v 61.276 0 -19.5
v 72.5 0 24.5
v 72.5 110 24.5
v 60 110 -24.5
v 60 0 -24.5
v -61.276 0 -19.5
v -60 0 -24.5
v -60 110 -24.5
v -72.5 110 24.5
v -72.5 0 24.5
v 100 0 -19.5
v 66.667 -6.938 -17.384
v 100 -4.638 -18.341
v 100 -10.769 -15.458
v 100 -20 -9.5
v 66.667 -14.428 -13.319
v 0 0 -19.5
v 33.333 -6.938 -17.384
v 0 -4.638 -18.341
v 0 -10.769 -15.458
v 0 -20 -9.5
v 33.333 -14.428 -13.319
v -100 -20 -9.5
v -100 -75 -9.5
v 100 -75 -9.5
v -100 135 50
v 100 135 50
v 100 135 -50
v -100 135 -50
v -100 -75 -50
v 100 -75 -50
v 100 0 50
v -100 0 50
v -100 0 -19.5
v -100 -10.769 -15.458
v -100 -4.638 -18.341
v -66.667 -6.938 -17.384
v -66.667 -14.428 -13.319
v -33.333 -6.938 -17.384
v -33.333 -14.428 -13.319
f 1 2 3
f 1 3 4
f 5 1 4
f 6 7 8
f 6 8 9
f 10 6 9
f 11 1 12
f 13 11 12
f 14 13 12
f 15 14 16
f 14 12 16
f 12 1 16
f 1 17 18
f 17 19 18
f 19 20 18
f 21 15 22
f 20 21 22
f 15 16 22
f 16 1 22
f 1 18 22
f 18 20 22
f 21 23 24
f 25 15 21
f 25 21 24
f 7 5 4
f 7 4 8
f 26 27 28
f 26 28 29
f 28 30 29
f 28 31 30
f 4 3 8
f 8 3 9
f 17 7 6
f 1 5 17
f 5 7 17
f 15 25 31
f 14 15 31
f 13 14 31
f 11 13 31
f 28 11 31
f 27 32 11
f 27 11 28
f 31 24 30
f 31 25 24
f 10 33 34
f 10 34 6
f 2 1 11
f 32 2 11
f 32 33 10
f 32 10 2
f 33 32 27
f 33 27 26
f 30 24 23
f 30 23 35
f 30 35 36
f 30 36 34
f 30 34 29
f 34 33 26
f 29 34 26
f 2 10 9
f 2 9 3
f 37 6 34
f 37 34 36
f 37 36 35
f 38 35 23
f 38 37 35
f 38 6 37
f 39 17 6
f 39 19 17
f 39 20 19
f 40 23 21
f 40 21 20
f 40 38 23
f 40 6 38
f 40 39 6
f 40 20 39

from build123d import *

# Parameters (mm, degrees)
F0_W     = 200
F0_H     = 100
F1_DEPTH = 110
F2_W     = 200
F2_H     = 100
F3_DEPTH = 25
F5_DEPTH = 100


with BuildPart() as f1:
    # F0 (on Front) → F1 (new body)
    with BuildSketch(Plane.XZ):
        Rectangle(F0_W, F0_H)
        Polygon((-60, -24.5), (-72.5, 24.5), (72.5, 24.5), (60, -24.5), align=None, mode=Mode.SUBTRACT)
    extrude(amount=-F1_DEPTH)

    # F2 (on face) → F3 (join)
    with BuildSketch(Plane(origin=(0, 110, 0), x_dir=(-1, 0, 0), z_dir=(0, 1, 0))):
        Rectangle(F2_W, F2_H)
    extrude(amount=F3_DEPTH)

    # F4 (on Right) → F5 (join, symmetric)
    with BuildSketch(Plane.YZ):
        with BuildLine():
            Line((-75, -50), (0, -50))
            Line((0, -50), (0, -19.5))
            add(Edge.make_bspline(
                [(0, -19.5), (-5.83801, -19.088345), (-16.211687, -12.465747), (-20, -9.5)],
                knots=[0, 0, 0, 0, 22.36068, 22.36068, 22.36068, 22.36068], degree=3))
            Line((-20, -9.5), (-75, -9.5))
            Line((-75, -9.5), (-75, -50))
        make_face()
    extrude(amount=F5_DEPTH, both=True)


solid = f1.part
